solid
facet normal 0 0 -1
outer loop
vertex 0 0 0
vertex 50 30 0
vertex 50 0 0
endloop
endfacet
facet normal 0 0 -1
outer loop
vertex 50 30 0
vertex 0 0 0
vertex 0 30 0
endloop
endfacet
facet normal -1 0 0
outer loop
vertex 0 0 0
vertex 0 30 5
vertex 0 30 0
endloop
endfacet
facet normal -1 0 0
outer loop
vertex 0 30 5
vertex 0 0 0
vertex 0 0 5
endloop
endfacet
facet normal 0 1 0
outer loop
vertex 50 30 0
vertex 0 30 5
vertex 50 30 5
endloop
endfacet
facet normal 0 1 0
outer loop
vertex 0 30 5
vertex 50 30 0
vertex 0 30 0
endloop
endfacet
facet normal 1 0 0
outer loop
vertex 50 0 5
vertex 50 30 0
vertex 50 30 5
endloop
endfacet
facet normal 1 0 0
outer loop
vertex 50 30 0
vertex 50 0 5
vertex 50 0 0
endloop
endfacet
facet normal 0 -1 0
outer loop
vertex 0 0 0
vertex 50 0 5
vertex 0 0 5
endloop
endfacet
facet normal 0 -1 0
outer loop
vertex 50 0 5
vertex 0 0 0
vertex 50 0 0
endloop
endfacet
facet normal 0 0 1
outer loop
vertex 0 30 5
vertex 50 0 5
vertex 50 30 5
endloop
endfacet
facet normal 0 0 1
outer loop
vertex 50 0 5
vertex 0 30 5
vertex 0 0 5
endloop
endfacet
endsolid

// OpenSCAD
module box(w, l, h){
    polyhedron(
        points=[
            // lowest layer
            [0, 0, 0],
            [0, w, 0],
            [l, w, 0],
            [l, 0, 0],

            // top layer
            [0, 0, h],
            [0, w, h],
            [l, w, h],
            [l, 0, h]
        ],
        faces=[
            // bottom
            [0, 3, 2, 1],

            // sides beginning with front
            [0, 1, 5, 4],
            [1, 2, 6, 5],
            [3, 7, 6, 2],
            [0, 4, 7, 3],

            // top
            [4, 5, 6, 7]
        ]
    );
}

box(30, 50, 5);
